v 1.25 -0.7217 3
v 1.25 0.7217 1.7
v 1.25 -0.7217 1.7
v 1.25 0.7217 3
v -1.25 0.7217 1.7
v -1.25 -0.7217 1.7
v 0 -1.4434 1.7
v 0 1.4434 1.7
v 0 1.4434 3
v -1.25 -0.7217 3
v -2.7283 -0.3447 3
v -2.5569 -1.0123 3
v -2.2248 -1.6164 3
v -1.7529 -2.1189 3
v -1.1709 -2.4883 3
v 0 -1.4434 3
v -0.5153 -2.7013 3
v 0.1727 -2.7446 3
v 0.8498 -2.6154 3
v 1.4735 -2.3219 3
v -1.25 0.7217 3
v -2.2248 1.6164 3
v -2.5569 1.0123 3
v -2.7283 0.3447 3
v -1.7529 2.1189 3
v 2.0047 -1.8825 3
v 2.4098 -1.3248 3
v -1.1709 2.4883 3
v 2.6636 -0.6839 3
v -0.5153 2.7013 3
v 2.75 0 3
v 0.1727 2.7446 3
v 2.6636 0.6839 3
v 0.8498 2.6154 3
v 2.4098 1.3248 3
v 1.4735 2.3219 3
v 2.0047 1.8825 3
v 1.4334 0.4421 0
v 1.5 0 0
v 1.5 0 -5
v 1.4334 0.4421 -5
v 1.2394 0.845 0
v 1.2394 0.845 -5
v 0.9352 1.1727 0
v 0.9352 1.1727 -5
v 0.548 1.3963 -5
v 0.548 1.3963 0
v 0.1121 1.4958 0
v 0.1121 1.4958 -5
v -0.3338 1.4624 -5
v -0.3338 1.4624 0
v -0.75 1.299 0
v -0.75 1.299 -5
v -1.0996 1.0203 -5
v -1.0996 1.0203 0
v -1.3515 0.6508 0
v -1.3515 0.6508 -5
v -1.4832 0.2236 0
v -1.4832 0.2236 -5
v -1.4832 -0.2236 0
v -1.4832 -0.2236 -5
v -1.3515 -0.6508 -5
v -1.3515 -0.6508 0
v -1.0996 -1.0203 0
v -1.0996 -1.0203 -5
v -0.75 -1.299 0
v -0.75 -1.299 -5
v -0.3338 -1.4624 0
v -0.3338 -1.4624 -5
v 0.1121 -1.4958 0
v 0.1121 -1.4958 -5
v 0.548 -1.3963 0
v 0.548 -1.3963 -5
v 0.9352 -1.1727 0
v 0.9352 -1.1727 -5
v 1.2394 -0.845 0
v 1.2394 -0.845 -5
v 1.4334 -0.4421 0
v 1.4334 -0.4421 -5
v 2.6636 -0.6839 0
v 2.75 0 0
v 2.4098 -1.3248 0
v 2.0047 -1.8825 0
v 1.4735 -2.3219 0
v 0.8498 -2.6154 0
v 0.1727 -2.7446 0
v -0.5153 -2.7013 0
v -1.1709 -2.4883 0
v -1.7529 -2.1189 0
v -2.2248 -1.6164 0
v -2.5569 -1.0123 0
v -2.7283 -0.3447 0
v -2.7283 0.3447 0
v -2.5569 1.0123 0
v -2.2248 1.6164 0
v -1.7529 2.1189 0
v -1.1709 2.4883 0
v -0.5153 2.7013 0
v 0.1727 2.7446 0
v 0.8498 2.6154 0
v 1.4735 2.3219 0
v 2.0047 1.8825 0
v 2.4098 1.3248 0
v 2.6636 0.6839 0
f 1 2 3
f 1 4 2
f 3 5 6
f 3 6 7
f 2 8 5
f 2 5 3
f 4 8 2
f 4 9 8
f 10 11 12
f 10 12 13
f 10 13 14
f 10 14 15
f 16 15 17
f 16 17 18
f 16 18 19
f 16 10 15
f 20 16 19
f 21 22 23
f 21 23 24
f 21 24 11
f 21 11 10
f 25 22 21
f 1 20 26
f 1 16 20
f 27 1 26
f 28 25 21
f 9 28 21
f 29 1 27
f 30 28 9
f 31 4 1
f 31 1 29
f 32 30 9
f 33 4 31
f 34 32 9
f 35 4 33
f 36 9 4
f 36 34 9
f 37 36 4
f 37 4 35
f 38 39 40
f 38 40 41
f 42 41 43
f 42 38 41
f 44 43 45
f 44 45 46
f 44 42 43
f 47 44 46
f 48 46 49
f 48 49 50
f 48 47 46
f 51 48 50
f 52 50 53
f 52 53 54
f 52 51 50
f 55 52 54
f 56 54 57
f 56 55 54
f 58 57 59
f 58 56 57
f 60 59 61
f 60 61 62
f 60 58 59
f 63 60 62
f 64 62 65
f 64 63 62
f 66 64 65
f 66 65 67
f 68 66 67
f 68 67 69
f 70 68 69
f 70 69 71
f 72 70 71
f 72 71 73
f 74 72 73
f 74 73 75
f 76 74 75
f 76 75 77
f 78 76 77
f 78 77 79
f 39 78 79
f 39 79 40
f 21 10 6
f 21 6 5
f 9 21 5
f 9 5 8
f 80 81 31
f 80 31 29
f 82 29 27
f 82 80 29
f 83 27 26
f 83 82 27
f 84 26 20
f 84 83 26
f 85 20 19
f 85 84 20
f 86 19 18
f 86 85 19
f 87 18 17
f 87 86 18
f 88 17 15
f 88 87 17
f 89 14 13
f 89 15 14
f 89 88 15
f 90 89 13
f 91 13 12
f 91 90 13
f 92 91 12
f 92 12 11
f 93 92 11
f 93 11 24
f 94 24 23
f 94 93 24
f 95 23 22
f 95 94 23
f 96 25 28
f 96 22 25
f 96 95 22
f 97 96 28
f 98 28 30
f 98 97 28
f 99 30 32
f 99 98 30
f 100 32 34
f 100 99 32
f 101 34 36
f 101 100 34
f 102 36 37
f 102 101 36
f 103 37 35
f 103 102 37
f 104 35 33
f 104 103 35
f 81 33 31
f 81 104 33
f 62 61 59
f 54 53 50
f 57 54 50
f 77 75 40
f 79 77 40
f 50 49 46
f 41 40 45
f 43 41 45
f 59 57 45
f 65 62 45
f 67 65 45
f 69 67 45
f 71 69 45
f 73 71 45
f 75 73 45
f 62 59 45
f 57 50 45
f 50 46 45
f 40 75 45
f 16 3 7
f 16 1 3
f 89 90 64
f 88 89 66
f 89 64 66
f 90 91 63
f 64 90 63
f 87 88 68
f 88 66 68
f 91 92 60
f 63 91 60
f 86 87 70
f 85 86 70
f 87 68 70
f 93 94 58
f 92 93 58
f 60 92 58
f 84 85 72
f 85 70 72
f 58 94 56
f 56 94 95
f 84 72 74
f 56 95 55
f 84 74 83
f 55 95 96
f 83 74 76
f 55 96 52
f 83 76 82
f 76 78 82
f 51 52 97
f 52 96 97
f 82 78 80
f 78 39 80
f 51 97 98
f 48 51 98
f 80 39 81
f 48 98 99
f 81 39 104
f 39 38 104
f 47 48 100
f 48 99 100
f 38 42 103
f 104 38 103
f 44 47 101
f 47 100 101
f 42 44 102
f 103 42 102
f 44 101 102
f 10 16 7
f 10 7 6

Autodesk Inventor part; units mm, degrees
ref_plane "YZ Plane" through (0, 0, 0) normal (1, 0, 0) x (0, 1, 0)
ref_plane "XZ Plane" through (0, 0, 0) normal (0, 1, 0) x (-1, 0, 0)
ref_plane "XY Plane" through (0, 0, 0) normal (0, 0, 1) x (1, 0, 0)
sketch "スケッチ1" plane through (0, 0, 0) normal (0, 0, 1) x (1, 0, 0)
  circle A0 centre (0, 0) radius 1.5
  dimension "d0" = 3
extrude "押し出し1" add sketch "スケッチ1" against normal blind 5
sketch "スケッチ2" plane through (0, 0, 0) normal (0, 0, 1) x (1, 0, 0)
  circle A0 centre (0, 0) radius 2.75
  dimension "d3" = 5.5
extrude "押し出し2" add sketch "スケッチ2" along normal blind 3
sketch "スケッチ3" plane through (0, 0, 3) normal (0, 0, 1) x (1, 0, 0)
  line L0 (0, 1.4434) -> (1.25, 0.7217)
  line L1 (1.25, 0.7217) -> (1.25, -0.7217)
  line L2 (1.25, -0.7217) -> (0, -1.4434)
  line L3 (0, -1.4434) -> (-1.25, -0.7217)
  line L4 (-1.25, -0.7217) -> (-1.25, 0.7217)
  line L5 (-1.25, 0.7217) -> (0, 1.4434)
  point P0 (0, 0)
  point P1 (0, 0)
  dimension "d6" = 2.5
extrude "押し出し3" cut sketch "スケッチ3" against normal blind 1.3
thread "ねじ1" size "M3x0.5" class "6g" standard "ANSI Metric M Profile" full length
properties part number "M3キャップボルト5" material "鋼、高強度、低合金"
